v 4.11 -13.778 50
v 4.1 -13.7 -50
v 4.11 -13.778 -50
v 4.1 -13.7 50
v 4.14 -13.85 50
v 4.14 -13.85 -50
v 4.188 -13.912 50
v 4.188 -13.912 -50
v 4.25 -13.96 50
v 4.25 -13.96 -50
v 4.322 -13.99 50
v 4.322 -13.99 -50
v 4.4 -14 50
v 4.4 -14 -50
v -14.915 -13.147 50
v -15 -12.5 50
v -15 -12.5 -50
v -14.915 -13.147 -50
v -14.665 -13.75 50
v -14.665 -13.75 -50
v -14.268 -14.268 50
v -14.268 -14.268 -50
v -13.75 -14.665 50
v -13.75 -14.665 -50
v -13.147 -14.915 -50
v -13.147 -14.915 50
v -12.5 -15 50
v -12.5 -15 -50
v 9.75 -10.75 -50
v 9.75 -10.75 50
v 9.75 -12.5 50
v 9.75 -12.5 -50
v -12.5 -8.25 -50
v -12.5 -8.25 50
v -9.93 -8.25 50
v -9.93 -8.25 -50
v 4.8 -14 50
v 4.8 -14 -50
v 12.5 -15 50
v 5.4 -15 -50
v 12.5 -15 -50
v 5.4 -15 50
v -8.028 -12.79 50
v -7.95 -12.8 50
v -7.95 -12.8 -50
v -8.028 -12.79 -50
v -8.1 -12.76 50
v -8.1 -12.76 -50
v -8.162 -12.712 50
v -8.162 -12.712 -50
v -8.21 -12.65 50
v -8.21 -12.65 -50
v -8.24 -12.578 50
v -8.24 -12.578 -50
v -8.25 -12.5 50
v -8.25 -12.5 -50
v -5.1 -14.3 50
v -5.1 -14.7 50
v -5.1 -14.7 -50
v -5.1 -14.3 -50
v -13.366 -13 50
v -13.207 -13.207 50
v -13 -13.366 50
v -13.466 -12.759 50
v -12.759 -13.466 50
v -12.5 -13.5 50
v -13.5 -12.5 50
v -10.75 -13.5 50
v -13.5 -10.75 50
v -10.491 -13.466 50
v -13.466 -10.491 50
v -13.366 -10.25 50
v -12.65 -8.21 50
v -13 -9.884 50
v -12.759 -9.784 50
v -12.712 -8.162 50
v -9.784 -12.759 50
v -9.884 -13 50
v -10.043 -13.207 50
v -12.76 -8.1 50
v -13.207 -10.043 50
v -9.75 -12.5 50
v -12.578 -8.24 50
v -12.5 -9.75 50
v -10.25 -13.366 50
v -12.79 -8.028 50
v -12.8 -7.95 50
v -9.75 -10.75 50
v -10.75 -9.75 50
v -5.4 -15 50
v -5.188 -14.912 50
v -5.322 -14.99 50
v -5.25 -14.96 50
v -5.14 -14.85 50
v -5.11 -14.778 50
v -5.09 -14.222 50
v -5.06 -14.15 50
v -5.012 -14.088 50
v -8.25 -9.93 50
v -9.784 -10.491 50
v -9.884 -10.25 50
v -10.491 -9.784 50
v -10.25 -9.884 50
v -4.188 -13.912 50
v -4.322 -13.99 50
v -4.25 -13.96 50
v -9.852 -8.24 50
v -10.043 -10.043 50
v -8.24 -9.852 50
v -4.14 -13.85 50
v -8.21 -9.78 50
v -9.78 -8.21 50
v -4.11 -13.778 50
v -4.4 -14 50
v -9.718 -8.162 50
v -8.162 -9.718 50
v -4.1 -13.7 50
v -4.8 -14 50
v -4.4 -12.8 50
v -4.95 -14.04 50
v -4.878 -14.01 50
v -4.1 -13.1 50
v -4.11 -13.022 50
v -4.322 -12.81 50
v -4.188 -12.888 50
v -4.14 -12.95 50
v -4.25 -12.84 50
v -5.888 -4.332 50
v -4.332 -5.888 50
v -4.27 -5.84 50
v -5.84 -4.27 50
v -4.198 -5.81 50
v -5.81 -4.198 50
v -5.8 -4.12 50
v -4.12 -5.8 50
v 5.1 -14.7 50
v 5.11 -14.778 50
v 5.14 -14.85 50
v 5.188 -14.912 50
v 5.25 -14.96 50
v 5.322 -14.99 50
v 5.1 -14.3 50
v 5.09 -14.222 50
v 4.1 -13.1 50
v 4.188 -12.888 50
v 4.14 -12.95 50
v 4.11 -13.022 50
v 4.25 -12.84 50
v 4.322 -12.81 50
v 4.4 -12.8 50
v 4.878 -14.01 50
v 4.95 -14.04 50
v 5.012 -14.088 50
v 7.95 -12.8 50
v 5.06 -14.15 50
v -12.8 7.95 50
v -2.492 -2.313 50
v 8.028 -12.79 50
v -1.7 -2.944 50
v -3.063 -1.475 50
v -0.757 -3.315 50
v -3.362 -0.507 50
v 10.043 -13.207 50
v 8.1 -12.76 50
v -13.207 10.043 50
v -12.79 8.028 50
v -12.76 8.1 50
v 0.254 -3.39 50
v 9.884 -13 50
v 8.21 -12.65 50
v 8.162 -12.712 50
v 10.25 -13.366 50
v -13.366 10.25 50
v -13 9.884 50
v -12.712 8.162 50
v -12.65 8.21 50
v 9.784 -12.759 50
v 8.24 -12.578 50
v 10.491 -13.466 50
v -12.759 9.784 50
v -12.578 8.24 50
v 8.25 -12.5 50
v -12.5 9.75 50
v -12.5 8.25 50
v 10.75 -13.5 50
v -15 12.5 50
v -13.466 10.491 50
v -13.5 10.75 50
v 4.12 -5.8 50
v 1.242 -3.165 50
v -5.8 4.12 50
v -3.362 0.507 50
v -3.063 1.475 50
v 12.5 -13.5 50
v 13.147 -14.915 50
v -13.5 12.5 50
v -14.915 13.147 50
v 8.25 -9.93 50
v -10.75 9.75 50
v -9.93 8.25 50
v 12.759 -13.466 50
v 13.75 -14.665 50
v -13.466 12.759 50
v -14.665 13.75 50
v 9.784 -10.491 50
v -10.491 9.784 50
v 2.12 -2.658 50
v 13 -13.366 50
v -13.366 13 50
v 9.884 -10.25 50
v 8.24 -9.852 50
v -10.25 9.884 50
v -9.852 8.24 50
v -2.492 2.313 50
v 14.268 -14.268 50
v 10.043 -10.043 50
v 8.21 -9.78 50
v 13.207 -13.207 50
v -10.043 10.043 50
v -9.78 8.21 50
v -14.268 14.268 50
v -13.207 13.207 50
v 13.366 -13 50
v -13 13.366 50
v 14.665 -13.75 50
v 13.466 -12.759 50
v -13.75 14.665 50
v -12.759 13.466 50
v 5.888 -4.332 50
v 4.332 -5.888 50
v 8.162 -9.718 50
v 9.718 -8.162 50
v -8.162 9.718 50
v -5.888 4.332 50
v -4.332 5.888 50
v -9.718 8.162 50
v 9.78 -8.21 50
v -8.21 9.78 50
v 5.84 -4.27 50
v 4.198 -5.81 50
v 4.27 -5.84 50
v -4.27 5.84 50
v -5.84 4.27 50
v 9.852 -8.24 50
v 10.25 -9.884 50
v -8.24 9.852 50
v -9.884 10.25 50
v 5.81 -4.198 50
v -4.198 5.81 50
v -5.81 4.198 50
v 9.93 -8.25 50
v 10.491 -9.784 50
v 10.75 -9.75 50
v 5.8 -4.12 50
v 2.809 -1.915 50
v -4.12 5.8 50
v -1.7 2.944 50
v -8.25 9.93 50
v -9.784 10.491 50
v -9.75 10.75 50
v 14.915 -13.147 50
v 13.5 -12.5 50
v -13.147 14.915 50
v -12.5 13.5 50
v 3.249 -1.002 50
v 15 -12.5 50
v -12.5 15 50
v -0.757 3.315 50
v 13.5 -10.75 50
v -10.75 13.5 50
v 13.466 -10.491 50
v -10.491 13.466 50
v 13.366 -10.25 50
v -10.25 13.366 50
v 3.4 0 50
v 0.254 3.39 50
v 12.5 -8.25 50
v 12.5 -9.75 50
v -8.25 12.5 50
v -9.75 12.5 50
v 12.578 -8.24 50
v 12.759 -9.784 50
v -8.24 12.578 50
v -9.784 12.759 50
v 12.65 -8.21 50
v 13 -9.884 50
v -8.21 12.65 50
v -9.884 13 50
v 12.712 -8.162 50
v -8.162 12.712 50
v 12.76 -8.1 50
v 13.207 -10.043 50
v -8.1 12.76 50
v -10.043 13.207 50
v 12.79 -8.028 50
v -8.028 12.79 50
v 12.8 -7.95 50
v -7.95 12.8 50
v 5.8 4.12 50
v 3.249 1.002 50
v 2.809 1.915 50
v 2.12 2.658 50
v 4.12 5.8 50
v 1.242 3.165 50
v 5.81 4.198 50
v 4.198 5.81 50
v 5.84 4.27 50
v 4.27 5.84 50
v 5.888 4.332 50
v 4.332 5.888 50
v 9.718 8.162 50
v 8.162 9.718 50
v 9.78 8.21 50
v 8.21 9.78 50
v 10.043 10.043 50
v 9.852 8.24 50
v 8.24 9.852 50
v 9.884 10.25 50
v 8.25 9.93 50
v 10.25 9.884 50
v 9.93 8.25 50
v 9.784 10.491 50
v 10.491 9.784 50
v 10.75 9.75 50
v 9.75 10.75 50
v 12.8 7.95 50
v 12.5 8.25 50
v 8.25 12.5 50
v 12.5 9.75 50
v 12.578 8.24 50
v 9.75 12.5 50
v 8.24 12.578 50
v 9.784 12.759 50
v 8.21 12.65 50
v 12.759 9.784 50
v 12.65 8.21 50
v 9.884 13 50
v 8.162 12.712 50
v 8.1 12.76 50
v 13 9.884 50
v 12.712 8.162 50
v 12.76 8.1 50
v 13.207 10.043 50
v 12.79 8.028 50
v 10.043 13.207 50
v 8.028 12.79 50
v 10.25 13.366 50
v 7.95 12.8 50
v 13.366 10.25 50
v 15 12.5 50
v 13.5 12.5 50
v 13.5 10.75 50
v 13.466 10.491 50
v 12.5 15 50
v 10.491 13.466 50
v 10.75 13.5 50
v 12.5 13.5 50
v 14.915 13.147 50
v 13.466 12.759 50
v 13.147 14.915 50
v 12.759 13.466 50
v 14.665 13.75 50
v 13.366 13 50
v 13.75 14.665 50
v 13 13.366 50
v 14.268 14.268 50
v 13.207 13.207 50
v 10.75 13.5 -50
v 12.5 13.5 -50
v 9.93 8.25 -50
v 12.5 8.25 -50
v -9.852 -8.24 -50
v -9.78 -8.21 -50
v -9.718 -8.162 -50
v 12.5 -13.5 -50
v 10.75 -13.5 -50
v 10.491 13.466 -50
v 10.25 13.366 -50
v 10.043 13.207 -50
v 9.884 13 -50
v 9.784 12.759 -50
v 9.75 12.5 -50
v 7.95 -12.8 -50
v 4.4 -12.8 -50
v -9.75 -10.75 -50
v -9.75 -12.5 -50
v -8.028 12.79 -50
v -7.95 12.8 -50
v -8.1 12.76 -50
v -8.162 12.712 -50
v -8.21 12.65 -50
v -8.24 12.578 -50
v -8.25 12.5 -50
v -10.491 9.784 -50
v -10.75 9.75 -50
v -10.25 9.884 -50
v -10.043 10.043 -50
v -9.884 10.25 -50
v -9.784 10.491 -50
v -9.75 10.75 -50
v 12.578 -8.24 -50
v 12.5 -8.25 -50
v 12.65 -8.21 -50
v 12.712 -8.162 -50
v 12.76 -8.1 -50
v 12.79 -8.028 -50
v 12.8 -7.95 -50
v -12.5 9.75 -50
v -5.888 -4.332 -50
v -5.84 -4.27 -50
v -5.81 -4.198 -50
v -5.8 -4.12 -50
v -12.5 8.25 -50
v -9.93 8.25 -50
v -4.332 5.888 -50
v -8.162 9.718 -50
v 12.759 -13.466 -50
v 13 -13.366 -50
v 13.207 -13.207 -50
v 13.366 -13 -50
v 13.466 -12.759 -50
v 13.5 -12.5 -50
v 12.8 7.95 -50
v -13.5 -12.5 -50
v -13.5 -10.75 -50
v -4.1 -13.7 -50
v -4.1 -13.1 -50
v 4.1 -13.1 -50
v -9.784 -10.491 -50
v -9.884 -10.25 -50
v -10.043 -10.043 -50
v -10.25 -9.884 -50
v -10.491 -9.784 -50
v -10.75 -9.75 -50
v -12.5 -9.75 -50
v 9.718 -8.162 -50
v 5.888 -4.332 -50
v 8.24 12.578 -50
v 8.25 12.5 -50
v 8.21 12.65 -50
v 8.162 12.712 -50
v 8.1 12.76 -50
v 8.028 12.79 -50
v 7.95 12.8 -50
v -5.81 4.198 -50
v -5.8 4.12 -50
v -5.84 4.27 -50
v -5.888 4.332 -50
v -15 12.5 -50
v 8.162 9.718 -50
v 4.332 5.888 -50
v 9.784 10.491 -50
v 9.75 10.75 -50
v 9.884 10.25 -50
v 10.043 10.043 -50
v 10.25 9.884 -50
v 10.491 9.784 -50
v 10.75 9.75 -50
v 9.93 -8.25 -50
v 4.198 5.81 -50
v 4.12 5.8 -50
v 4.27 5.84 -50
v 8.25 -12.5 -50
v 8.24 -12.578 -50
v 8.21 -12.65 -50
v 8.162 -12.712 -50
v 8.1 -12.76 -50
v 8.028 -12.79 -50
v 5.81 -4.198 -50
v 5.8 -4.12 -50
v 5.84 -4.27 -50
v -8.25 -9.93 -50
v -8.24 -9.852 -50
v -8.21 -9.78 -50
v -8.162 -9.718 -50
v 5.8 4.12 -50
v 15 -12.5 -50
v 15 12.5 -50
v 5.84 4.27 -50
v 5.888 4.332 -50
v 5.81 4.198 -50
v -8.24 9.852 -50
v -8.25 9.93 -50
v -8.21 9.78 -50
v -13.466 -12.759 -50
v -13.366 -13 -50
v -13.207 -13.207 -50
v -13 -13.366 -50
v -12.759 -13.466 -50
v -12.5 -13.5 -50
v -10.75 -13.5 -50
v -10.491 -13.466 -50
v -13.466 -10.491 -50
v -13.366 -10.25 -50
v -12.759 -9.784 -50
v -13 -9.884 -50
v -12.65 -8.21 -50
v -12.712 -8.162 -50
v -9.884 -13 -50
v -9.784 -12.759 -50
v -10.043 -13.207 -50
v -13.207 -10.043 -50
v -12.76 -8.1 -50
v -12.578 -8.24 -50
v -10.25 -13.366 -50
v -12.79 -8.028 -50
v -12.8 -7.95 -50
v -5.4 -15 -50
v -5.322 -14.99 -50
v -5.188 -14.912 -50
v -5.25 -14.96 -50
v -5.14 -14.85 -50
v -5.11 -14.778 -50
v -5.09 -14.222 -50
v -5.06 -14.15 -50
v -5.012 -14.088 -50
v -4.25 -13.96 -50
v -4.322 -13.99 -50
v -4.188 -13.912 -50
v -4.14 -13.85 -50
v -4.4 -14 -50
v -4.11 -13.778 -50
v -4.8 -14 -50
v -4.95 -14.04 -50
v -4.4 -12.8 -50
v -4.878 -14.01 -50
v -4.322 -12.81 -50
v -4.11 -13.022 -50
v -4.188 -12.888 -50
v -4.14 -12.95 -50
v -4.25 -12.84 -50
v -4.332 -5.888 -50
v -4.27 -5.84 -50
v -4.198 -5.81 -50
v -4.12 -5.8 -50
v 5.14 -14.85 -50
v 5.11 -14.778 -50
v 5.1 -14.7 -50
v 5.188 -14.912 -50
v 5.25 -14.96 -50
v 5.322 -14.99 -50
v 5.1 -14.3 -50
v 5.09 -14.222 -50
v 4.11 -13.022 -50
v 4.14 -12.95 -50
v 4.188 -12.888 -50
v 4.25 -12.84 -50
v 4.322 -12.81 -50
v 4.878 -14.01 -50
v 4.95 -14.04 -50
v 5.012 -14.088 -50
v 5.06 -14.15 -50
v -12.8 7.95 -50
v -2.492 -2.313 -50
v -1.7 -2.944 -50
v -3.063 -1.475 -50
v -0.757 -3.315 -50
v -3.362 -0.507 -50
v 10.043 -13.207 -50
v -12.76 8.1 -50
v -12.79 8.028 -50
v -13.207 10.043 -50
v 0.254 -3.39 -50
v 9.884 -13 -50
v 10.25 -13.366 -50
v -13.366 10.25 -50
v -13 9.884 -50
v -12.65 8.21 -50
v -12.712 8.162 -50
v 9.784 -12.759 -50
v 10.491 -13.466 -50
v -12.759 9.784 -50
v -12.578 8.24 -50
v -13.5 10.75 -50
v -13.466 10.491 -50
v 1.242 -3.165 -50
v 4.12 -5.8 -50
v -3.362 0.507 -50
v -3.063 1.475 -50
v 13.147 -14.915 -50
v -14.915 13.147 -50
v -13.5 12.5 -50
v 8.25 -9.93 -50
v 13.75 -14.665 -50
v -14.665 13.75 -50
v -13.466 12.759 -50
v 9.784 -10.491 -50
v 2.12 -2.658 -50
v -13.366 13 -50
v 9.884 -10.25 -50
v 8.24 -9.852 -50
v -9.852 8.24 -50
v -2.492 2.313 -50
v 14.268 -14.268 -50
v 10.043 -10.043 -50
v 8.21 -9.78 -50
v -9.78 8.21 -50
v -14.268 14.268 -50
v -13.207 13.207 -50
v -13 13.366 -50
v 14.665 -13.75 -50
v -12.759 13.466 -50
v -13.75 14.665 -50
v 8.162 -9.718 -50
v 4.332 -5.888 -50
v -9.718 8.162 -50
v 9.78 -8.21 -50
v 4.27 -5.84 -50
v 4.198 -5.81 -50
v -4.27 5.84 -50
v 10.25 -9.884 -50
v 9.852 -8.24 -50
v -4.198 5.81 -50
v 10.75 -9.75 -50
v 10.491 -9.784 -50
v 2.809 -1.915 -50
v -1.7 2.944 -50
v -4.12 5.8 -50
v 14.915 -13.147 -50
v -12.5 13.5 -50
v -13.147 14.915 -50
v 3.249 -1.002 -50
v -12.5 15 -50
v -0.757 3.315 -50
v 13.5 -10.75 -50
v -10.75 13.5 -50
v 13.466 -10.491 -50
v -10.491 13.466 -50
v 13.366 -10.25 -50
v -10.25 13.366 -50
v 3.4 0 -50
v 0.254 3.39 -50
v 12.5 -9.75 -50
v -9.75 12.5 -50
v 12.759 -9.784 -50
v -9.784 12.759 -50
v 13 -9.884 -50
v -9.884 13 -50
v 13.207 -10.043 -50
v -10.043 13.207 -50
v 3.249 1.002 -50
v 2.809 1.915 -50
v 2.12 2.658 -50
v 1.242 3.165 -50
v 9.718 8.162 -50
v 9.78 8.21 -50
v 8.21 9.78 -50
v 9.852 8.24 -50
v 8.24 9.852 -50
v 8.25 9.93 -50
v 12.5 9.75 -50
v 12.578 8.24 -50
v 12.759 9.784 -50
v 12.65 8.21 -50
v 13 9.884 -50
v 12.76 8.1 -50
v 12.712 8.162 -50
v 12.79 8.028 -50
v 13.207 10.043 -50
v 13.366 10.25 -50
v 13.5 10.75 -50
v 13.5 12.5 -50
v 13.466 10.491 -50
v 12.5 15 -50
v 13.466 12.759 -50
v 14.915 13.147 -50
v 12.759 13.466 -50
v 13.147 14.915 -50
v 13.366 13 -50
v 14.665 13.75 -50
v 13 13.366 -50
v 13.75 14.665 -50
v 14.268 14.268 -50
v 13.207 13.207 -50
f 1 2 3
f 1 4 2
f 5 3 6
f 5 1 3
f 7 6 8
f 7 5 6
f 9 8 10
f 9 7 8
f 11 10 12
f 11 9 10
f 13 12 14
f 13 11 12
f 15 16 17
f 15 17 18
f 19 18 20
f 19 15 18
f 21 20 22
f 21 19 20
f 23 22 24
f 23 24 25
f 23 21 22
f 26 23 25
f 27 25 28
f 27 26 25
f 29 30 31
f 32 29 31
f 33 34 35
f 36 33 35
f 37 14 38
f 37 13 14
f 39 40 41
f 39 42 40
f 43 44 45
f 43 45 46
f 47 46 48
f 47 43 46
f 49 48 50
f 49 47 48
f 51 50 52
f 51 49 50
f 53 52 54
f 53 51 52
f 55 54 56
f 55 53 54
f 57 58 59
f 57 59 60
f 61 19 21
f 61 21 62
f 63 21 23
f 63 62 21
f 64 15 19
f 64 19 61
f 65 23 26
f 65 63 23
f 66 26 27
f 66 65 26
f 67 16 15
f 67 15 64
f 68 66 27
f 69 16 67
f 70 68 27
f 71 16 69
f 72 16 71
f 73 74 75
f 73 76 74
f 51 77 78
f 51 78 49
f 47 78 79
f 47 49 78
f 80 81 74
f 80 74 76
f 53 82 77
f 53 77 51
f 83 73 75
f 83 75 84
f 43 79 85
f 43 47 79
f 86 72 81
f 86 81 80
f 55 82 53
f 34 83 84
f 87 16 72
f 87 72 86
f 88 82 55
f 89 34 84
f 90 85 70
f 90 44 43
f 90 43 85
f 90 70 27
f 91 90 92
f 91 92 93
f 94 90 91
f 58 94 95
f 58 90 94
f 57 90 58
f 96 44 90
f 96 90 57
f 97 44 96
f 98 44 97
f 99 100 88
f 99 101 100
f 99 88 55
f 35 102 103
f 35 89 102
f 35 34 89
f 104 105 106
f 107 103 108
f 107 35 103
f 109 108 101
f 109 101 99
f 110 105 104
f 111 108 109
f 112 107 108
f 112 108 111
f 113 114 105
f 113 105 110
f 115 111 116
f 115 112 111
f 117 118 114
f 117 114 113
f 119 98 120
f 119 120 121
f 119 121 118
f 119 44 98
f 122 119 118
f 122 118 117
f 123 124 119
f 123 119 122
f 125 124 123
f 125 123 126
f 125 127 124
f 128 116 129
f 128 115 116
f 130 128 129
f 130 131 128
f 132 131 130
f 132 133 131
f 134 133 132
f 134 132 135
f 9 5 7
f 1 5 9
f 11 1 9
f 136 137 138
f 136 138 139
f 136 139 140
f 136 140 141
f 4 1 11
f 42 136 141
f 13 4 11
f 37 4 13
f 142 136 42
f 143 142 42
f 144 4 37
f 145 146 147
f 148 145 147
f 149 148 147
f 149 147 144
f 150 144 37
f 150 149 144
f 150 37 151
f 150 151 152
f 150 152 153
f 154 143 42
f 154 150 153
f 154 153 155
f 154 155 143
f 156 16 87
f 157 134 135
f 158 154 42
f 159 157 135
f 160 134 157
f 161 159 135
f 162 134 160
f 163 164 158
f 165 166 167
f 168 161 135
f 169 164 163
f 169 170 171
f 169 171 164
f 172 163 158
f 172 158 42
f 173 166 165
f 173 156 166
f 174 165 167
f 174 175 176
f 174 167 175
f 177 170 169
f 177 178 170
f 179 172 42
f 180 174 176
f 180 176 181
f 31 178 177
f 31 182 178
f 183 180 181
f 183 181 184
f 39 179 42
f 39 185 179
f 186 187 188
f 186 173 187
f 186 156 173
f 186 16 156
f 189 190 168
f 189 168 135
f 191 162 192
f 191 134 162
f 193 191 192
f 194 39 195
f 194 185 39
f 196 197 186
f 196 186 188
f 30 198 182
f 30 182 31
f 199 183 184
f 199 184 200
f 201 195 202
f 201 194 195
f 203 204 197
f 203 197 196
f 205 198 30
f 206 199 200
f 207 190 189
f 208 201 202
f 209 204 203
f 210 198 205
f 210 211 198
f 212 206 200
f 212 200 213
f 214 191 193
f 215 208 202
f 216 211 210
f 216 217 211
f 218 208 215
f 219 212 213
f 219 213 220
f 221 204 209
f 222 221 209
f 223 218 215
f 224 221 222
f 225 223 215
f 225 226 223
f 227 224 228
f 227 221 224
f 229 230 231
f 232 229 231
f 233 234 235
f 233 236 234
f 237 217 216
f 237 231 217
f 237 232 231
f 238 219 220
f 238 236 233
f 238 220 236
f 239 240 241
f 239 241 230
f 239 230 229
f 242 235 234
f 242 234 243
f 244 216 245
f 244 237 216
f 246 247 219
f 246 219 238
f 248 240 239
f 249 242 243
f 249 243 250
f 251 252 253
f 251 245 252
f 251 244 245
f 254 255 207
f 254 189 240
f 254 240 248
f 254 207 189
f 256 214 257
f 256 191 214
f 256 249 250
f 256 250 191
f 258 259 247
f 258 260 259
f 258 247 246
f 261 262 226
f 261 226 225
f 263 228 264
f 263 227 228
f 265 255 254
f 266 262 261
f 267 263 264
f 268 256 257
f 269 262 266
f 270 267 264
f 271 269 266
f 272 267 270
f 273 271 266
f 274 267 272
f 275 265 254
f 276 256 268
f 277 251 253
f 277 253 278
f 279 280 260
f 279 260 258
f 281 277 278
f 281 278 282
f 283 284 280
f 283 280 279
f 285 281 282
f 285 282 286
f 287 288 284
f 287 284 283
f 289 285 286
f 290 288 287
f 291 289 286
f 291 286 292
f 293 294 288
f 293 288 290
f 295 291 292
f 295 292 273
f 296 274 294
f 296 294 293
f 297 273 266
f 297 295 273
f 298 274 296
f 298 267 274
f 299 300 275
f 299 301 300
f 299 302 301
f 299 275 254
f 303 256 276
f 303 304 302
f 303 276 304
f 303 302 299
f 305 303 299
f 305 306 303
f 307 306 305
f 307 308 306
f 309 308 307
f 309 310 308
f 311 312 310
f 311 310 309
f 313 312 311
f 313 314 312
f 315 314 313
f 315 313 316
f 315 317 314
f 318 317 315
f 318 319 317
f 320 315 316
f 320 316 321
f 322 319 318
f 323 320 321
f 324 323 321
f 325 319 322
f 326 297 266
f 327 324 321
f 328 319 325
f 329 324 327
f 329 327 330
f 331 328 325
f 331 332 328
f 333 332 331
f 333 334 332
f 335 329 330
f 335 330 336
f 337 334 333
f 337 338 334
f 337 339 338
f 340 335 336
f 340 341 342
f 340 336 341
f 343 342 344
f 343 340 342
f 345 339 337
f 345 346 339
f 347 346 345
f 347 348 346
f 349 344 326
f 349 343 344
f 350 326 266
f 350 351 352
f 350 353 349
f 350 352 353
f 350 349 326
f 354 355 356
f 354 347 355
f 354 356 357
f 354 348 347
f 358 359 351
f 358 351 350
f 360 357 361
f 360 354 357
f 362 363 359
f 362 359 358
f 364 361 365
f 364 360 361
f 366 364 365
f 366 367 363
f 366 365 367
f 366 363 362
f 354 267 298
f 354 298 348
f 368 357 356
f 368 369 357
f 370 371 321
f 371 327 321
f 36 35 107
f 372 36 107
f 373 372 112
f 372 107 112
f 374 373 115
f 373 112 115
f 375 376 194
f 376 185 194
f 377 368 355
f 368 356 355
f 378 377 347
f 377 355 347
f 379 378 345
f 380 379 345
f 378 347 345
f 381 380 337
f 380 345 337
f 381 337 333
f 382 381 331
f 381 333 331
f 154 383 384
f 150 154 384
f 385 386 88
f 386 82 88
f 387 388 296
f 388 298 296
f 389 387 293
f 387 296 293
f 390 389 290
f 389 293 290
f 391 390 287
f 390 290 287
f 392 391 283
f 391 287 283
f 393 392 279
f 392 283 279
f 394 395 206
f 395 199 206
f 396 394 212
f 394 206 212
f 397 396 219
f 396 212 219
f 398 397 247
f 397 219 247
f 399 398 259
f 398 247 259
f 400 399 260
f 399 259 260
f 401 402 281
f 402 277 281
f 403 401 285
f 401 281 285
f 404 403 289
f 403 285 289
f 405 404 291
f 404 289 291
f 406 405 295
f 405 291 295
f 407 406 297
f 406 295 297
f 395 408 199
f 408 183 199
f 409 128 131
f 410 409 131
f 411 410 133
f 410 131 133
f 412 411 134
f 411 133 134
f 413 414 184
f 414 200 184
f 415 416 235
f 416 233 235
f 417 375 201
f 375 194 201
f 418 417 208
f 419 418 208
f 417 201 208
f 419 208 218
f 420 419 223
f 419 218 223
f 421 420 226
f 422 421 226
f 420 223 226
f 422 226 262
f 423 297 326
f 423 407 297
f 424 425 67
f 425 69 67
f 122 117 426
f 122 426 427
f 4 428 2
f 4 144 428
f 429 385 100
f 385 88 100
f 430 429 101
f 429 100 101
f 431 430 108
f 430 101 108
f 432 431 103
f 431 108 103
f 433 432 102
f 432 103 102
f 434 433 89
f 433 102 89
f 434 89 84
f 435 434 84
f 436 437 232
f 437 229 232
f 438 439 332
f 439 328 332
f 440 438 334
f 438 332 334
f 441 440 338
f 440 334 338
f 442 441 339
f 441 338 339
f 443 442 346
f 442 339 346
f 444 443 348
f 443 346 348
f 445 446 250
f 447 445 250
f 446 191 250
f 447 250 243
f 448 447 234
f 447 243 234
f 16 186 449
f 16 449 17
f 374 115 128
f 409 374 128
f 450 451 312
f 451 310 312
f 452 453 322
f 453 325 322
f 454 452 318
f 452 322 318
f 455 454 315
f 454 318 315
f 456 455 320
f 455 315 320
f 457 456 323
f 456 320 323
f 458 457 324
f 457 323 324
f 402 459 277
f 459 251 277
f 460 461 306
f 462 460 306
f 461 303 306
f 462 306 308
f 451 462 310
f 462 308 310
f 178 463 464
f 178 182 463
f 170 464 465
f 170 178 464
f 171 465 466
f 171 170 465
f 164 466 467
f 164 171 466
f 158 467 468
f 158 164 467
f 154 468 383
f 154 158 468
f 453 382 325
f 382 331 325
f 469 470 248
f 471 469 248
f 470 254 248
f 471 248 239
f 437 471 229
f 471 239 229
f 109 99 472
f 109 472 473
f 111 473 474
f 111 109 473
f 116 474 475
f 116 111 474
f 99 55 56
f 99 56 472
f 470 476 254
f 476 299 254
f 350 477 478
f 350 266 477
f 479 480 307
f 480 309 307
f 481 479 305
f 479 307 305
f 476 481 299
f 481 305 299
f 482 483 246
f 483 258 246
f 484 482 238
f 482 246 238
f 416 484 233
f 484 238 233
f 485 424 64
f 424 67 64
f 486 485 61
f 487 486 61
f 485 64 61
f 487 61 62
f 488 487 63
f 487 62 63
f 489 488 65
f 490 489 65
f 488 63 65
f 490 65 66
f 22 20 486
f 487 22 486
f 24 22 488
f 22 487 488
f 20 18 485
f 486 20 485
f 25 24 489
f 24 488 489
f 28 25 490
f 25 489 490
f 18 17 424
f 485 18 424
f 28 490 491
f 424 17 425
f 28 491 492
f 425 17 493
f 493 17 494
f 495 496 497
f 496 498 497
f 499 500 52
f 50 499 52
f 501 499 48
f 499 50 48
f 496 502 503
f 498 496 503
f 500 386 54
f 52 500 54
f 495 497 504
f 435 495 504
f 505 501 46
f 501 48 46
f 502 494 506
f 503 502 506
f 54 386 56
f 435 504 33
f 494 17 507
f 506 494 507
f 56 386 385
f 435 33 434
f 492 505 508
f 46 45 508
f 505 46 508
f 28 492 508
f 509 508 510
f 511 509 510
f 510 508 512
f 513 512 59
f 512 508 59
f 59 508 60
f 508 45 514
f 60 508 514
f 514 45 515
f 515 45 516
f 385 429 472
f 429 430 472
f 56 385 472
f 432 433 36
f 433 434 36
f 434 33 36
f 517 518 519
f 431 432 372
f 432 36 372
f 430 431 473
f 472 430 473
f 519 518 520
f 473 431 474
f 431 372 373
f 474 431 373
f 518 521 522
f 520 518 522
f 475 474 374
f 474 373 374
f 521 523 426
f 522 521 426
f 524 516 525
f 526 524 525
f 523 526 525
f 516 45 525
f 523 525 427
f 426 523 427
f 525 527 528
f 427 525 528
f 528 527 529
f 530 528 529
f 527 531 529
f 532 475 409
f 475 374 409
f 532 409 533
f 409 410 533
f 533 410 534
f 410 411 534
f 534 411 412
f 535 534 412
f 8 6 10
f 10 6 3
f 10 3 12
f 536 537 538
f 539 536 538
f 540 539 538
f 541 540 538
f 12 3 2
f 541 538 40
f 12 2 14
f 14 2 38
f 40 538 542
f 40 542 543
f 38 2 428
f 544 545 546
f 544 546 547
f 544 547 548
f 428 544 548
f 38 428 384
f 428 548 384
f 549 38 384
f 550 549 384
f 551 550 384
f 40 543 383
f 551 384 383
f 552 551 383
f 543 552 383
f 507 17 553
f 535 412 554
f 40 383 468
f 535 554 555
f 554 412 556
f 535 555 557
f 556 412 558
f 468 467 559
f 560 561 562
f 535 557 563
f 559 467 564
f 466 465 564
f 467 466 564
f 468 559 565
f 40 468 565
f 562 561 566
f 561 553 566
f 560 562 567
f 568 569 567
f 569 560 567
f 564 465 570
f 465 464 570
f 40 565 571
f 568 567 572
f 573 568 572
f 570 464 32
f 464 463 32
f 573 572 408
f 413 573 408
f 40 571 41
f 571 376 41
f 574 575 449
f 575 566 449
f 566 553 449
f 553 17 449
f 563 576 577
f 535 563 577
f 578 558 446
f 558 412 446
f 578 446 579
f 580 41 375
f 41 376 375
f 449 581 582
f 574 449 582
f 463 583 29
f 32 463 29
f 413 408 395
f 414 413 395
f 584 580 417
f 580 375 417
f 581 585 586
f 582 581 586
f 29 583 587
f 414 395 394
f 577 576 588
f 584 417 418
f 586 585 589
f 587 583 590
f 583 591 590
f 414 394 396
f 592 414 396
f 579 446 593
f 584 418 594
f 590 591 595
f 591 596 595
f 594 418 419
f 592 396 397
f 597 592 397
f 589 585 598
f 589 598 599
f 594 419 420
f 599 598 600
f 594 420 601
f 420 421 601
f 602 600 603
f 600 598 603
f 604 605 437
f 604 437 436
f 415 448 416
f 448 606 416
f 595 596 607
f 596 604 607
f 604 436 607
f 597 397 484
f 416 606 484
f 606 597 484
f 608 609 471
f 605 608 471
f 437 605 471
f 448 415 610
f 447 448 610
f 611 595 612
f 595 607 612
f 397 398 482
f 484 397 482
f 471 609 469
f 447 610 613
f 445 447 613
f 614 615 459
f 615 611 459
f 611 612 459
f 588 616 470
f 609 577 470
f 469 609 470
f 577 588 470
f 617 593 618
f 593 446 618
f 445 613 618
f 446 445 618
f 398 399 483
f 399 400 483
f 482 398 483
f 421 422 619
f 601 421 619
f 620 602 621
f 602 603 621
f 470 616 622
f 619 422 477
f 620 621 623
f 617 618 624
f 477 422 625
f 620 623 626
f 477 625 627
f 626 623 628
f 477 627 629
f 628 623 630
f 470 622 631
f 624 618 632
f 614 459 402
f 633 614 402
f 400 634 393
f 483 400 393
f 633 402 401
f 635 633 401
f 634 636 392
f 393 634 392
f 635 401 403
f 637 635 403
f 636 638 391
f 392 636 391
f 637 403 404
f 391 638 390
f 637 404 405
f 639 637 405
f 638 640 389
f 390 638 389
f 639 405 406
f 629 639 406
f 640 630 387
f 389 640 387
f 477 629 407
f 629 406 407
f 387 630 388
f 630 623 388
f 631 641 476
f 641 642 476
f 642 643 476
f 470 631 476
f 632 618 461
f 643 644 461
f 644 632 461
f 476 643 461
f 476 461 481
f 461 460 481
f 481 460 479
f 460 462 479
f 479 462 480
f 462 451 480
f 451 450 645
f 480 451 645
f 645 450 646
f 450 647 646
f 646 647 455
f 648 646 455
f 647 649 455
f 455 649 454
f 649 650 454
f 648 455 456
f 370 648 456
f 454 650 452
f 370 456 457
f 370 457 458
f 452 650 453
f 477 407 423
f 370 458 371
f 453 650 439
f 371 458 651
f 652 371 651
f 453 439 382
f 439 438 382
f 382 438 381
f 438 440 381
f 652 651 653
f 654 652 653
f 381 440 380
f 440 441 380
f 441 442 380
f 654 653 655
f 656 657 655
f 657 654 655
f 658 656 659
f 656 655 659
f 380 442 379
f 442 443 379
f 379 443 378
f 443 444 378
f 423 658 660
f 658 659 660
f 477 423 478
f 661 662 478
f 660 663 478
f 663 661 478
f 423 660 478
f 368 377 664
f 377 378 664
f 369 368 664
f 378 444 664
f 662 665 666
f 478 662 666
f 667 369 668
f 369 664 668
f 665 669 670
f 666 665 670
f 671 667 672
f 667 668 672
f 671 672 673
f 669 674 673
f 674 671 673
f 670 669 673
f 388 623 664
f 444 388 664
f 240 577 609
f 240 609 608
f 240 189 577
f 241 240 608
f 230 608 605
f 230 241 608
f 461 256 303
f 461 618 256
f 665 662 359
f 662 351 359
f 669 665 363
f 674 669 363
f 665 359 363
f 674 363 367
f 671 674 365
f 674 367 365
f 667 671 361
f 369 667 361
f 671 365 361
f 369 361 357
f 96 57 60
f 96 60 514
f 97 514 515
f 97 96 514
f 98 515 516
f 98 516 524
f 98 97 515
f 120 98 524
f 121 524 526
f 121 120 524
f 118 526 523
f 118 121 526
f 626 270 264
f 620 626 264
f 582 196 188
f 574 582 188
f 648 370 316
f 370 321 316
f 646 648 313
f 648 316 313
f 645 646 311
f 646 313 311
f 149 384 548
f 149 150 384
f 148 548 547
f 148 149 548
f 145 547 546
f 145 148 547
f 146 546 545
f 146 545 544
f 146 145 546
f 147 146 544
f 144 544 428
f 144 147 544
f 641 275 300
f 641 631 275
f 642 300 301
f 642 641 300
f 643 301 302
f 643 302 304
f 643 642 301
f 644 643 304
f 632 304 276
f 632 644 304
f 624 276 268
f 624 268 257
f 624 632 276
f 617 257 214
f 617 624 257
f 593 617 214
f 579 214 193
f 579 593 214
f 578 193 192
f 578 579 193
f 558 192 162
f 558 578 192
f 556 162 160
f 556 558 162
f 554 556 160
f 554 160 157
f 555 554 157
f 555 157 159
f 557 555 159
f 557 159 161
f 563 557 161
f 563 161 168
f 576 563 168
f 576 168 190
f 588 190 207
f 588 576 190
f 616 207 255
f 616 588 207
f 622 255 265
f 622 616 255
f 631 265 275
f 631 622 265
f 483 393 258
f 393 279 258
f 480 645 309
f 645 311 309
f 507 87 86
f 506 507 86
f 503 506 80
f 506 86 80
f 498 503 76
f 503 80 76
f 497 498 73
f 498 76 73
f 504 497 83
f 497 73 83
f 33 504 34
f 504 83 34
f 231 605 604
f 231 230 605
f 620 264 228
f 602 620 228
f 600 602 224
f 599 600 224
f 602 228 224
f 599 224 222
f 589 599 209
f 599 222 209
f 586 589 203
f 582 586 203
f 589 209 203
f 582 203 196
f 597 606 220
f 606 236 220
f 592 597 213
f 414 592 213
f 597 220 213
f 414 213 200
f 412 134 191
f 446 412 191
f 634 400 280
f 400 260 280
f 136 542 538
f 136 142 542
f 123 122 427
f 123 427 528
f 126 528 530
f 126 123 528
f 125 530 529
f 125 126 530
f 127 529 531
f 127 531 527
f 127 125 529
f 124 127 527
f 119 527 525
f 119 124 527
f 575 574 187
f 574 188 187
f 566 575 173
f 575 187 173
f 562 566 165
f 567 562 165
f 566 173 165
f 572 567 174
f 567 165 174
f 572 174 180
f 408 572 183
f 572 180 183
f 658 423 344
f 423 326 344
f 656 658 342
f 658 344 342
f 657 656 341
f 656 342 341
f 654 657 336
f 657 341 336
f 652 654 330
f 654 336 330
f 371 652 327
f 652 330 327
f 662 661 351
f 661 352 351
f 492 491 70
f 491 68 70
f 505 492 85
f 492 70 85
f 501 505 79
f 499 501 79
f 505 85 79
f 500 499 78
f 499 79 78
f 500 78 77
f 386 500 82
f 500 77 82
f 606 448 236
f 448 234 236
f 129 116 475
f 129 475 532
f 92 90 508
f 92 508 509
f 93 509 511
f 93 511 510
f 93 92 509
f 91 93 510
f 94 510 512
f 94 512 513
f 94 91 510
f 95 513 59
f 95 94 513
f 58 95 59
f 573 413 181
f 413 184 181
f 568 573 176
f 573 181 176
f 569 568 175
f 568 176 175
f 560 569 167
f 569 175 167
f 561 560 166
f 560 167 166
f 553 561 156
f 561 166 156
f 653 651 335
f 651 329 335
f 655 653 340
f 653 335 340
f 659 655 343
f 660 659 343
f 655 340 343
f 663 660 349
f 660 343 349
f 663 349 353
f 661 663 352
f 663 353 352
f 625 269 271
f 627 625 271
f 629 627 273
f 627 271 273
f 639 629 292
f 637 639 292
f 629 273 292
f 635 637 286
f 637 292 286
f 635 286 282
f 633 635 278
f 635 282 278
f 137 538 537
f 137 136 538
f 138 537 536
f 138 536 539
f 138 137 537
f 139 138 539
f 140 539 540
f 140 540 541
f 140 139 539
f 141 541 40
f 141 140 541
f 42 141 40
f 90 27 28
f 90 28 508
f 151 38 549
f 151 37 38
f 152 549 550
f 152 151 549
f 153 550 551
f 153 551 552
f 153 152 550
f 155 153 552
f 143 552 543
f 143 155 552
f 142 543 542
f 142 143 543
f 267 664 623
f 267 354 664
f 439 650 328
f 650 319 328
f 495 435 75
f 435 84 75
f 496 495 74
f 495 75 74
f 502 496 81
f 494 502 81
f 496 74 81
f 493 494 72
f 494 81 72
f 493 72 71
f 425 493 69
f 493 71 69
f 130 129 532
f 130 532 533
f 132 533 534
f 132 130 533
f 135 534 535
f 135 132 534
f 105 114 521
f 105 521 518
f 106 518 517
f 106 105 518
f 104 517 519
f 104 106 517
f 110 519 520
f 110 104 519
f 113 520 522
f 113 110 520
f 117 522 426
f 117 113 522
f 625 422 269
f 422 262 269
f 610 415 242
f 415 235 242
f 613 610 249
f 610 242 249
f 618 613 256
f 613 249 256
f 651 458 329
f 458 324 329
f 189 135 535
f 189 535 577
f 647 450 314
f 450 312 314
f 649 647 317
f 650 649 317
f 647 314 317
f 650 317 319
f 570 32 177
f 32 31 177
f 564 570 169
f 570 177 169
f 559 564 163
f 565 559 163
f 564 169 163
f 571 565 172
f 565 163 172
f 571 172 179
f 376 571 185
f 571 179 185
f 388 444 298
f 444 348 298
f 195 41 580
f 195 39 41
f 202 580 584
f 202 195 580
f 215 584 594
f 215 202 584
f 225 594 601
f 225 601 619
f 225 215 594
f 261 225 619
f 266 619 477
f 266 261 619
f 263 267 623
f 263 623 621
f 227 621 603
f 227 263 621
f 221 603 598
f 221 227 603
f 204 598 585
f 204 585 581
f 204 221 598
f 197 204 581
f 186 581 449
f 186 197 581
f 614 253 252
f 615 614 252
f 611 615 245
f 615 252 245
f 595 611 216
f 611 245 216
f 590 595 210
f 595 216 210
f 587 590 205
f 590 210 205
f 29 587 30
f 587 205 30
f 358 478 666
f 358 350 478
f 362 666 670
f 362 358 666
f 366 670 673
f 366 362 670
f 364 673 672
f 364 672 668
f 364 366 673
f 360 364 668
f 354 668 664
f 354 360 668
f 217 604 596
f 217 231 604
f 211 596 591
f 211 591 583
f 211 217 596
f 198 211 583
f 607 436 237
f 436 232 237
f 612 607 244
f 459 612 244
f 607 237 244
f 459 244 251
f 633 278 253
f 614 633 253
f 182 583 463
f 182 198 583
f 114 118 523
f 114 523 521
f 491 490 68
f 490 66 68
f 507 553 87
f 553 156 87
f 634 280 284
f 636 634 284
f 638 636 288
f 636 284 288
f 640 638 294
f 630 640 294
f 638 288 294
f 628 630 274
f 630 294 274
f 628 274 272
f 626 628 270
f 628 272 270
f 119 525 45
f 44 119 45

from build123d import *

# Parameters (mm, degrees)
SKETCH_1_R      = 3.399999997
EXTRUDE_1_DEPTH = 50


with BuildPart() as part:
    # 草图1 → 凸台-拉伸1 (new, symmetric)
    with BuildSketch(Plane.XY):
        with BuildLine():
            Line((12.49999999, 14.999999989), (-12.49999999, 14.999999989))
            ThreePointArc((-12.49999999, 14.999999989), (-14.267766942, 14.267766942), (-14.999999989, 12.49999999))
            Line((-14.999999989, 12.49999999), (-14.999999989, -12.49999999))
            ThreePointArc((-14.999999989, -12.49999999), (-14.267766942, -14.267766942), (-12.49999999, -14.999999989))
            Line((-12.49999999, -14.999999989), (-5.399999996, -14.999999989))
            ThreePointArc((-5.399999996, -14.999999989), (-5.187867962, -14.912132023), (-5.099999996, -14.699999989))
            Line((-5.099999996, -14.699999989), (-5.099999996, -14.299999989))
            ThreePointArc((-5.099999996, -14.299999989), (-5.01213203, -14.087867955), (-4.799999996, -13.999999989))
            Line((-4.799999996, -13.999999989), (-4.399999997, -13.999999989))
            ThreePointArc((-4.399999997, -13.999999989), (-4.187867962, -13.912132024), (-4.099999997, -13.69999999))
            Line((-4.099999997, -13.69999999), (-4.099999997, -13.09999999))
            ThreePointArc((-4.099999997, -13.09999999), (-4.187867962, -12.887867956), (-4.399999997, -12.79999999))
            Line((-4.399999997, -12.79999999), (-7.949999994, -12.79999999))
            ThreePointArc((-7.949999994, -12.79999999), (-8.162132028, -12.712132025), (-8.249999994, -12.499999991))
            Line((-8.249999994, -12.499999991), (-8.249999994, -9.92989898))
            ThreePointArc((-8.249999994, -9.92989898), (-8.227163854, -9.81509395), (-8.162132028, -9.717766946))
            Line((-8.162132028, -9.717766946), (-4.332233044, -5.887867961))
            ThreePointArc((-4.332233044, -5.887867961), (-4.234906039, -5.822836136), (-4.12010101, -5.799999996))
            Line((-4.12010101, -5.799999996), (4.12010101, -5.799999996))
            ThreePointArc((4.12010101, -5.799999996), (4.234906039, -5.822836136), (4.332233044, -5.887867961))
            Line((4.332233044, -5.887867961), (8.162132028, -9.717766946))
            ThreePointArc((8.162132028, -9.717766946), (8.227163854, -9.81509395), (8.249999994, -9.92989898))
            Line((8.249999994, -9.92989898), (8.249999994, -12.499999991))
            ThreePointArc((8.249999994, -12.499999991), (8.162132028, -12.712132025), (7.949999994, -12.79999999))
            Line((7.949999994, -12.79999999), (4.399999997, -12.79999999))
            ThreePointArc((4.399999997, -12.79999999), (4.187867962, -12.887867956), (4.099999997, -13.09999999))
            Line((4.099999997, -13.09999999), (4.099999997, -13.69999999))
            ThreePointArc((4.099999997, -13.69999999), (4.187867962, -13.912132024), (4.399999997, -13.999999989))
            Line((4.399999997, -13.999999989), (4.799999996, -13.999999989))
            ThreePointArc((4.799999996, -13.999999989), (5.01213203, -14.087867955), (5.099999996, -14.299999989))
            Line((5.099999996, -14.299999989), (5.099999996, -14.699999989))
            ThreePointArc((5.099999996, -14.699999989), (5.187867962, -14.912132023), (5.399999996, -14.999999989))
            Line((5.399999996, -14.999999989), (12.49999999, -14.999999989))
            ThreePointArc((12.49999999, -14.999999989), (14.267766942, -14.267766942), (14.999999989, -12.49999999))
            Line((14.999999989, -12.49999999), (14.999999989, 12.49999999))
            ThreePointArc((14.999999989, 12.49999999), (14.267766942, 14.267766942), (12.49999999, 14.999999989))
        make_face()
        Circle(SKETCH_1_R, mode=Mode.SUBTRACT)
        with BuildLine():
            Line((7.949999994, 12.79999999), (-7.949999994, 12.79999999))
            ThreePointArc((-7.949999994, 12.79999999), (-8.162132028, 12.712132025), (-8.249999994, 12.499999991))
            Line((-8.249999994, 12.499999991), (-8.249999994, 9.92989898))
            ThreePointArc((-8.249999994, 9.92989898), (-8.227163854, 9.81509395), (-8.162132028, 9.717766946))
            Line((-8.162132028, 9.717766946), (-4.332233044, 5.887867961))
            ThreePointArc((-4.332233044, 5.887867961), (-4.234906039, 5.822836136), (-4.12010101, 5.799999996))
            Line((-4.12010101, 5.799999996), (4.12010101, 5.799999996))
            ThreePointArc((4.12010101, 5.799999996), (4.234906039, 5.822836136), (4.332233044, 5.887867961))
            Line((4.332233044, 5.887867961), (8.162132028, 9.717766946))
            ThreePointArc((8.162132028, 9.717766946), (8.227163853, 9.81509395), (8.249999994, 9.92989898))
            Line((8.249999994, 9.92989898), (8.249999994, 12.499999991))
            ThreePointArc((8.249999994, 12.499999991), (8.162132028, 12.712132025), (7.949999994, 12.79999999))
        make_face(mode=Mode.SUBTRACT)
        with BuildLine():
            Line((10.749999992, 9.749999993), (12.499999991, 9.749999993))
            ThreePointArc((12.499999991, 9.749999993), (13.207106771, 10.042893211), (13.49999999, 10.749999992))
            Line((13.49999999, 10.749999992), (13.49999999, 12.49999999))
            ThreePointArc((13.49999999, 12.49999999), (13.207106771, 13.207106771), (12.49999999, 13.49999999))
            Line((12.49999999, 13.49999999), (10.749999992, 13.49999999))
            ThreePointArc((10.749999992, 13.49999999), (10.042893211, 13.207106771), (9.749999993, 12.499999991))
            Line((9.749999993, 12.499999991), (9.749999993, 10.749999992))
            ThreePointArc((9.749999993, 10.749999992), (10.042893211, 10.042893211), (10.749999992, 9.749999993))
        make_face(mode=Mode.SUBTRACT)
        with BuildLine():
            Line((-13.49999999, 12.49999999), (-13.49999999, 10.749999992))
            ThreePointArc((-13.49999999, 10.749999992), (-13.207106771, 10.042893211), (-12.499999991, 9.749999993))
            Line((-12.499999991, 9.749999993), (-10.749999992, 9.749999993))
            ThreePointArc((-10.749999992, 9.749999993), (-10.042893211, 10.042893211), (-9.749999993, 10.749999992))
            Line((-9.749999993, 10.749999992), (-9.749999993, 12.499999991))
            ThreePointArc((-9.749999993, 12.499999991), (-10.042893211, 13.207106771), (-10.749999992, 13.49999999))
            Line((-10.749999992, 13.49999999), (-12.49999999, 13.49999999))
            ThreePointArc((-12.49999999, 13.49999999), (-13.207106771, 13.207106771), (-13.49999999, 12.49999999))
        make_face(mode=Mode.SUBTRACT)
        with BuildLine():
            Line((9.749999993, -10.749999992), (9.749999993, -12.499999991))
            ThreePointArc((9.749999993, -12.499999991), (10.042893211, -13.207106771), (10.749999992, -13.49999999))
            Line((10.749999992, -13.49999999), (12.49999999, -13.49999999))
            ThreePointArc((12.49999999, -13.49999999), (13.207106771, -13.207106771), (13.49999999, -12.49999999))
            Line((13.49999999, -12.49999999), (13.49999999, -10.749999992))
            ThreePointArc((13.49999999, -10.749999992), (13.207106771, -10.042893211), (12.499999991, -9.749999993))
            Line((12.499999991, -9.749999993), (10.749999992, -9.749999993))
            ThreePointArc((10.749999992, -9.749999993), (10.042893211, -10.042893211), (9.749999993, -10.749999992))
        make_face(mode=Mode.SUBTRACT)
        with BuildLine():
            Line((-5.799999996, -4.12010101), (-5.799999996, 4.12010101))
            ThreePointArc((-5.799999996, 4.12010101), (-5.822836136, 4.234906039), (-5.887867961, 4.332233044))
            Line((-5.887867961, 4.332233044), (-9.717766946, 8.162132028))
            ThreePointArc((-9.717766946, 8.162132028), (-9.81509395, 8.227163854), (-9.92989898, 8.249999994))
            Line((-9.92989898, 8.249999994), (-12.499999991, 8.249999994))
            ThreePointArc((-12.499999991, 8.249999994), (-12.712132025, 8.162132028), (-12.79999999, 7.949999994))
            Line((-12.79999999, 7.949999994), (-12.79999999, -7.949999994))
            ThreePointArc((-12.79999999, -7.949999994), (-12.712132025, -8.162132028), (-12.499999991, -8.249999994))
            Line((-12.499999991, -8.249999994), (-9.92989898, -8.249999994))
            ThreePointArc((-9.92989898, -8.249999994), (-9.81509395, -8.227163854), (-9.717766946, -8.162132028))
            Line((-9.717766946, -8.162132028), (-5.887867961, -4.332233044))
            ThreePointArc((-5.887867961, -4.332233044), (-5.822836136, -4.234906039), (-5.799999996, -4.12010101))
        make_face(mode=Mode.SUBTRACT)
        with BuildLine():
            Line((5.799999996, 4.12010101), (5.799999996, -4.12010101))
            ThreePointArc((5.799999996, -4.12010101), (5.822836136, -4.234906039), (5.887867961, -4.332233044))
            Line((5.887867961, -4.332233044), (9.717766946, -8.162132028))
            ThreePointArc((9.717766946, -8.162132028), (9.81509395, -8.227163854), (9.92989898, -8.249999994))
            Line((9.92989898, -8.249999994), (12.499999991, -8.249999994))
            ThreePointArc((12.499999991, -8.249999994), (12.712132025, -8.162132028), (12.79999999, -7.949999994))
            Line((12.79999999, -7.949999994), (12.79999999, 7.949999994))
            ThreePointArc((12.79999999, 7.949999994), (12.712132025, 8.162132028), (12.499999991, 8.249999994))
            Line((12.499999991, 8.249999994), (9.92989898, 8.249999994))
            ThreePointArc((9.92989898, 8.249999994), (9.81509395, 8.227163854), (9.717766946, 8.162132028))
            Line((9.717766946, 8.162132028), (5.887867961, 4.332233044))
            ThreePointArc((5.887867961, 4.332233044), (5.822836136, 4.234906039), (5.799999996, 4.12010101))
        make_face(mode=Mode.SUBTRACT)
        with BuildLine():
            Line((-10.749999992, -9.749999993), (-12.499999991, -9.749999993))
            ThreePointArc((-12.499999991, -9.749999993), (-13.207106771, -10.042893211), (-13.49999999, -10.749999992))
            Line((-13.49999999, -10.749999992), (-13.49999999, -12.49999999))
            ThreePointArc((-13.49999999, -12.49999999), (-13.207106771, -13.207106771), (-12.49999999, -13.49999999))
            Line((-12.49999999, -13.49999999), (-10.749999992, -13.49999999))
            ThreePointArc((-10.749999992, -13.49999999), (-10.042893211, -13.207106771), (-9.749999993, -12.499999991))
            Line((-9.749999993, -12.499999991), (-9.749999993, -10.749999992))
            ThreePointArc((-9.749999993, -10.749999992), (-10.042893211, -10.042893211), (-10.749999992, -9.749999993))
        make_face(mode=Mode.SUBTRACT)
    extrude(amount=EXTRUDE_1_DEPTH, both=True)


solid = part.part
